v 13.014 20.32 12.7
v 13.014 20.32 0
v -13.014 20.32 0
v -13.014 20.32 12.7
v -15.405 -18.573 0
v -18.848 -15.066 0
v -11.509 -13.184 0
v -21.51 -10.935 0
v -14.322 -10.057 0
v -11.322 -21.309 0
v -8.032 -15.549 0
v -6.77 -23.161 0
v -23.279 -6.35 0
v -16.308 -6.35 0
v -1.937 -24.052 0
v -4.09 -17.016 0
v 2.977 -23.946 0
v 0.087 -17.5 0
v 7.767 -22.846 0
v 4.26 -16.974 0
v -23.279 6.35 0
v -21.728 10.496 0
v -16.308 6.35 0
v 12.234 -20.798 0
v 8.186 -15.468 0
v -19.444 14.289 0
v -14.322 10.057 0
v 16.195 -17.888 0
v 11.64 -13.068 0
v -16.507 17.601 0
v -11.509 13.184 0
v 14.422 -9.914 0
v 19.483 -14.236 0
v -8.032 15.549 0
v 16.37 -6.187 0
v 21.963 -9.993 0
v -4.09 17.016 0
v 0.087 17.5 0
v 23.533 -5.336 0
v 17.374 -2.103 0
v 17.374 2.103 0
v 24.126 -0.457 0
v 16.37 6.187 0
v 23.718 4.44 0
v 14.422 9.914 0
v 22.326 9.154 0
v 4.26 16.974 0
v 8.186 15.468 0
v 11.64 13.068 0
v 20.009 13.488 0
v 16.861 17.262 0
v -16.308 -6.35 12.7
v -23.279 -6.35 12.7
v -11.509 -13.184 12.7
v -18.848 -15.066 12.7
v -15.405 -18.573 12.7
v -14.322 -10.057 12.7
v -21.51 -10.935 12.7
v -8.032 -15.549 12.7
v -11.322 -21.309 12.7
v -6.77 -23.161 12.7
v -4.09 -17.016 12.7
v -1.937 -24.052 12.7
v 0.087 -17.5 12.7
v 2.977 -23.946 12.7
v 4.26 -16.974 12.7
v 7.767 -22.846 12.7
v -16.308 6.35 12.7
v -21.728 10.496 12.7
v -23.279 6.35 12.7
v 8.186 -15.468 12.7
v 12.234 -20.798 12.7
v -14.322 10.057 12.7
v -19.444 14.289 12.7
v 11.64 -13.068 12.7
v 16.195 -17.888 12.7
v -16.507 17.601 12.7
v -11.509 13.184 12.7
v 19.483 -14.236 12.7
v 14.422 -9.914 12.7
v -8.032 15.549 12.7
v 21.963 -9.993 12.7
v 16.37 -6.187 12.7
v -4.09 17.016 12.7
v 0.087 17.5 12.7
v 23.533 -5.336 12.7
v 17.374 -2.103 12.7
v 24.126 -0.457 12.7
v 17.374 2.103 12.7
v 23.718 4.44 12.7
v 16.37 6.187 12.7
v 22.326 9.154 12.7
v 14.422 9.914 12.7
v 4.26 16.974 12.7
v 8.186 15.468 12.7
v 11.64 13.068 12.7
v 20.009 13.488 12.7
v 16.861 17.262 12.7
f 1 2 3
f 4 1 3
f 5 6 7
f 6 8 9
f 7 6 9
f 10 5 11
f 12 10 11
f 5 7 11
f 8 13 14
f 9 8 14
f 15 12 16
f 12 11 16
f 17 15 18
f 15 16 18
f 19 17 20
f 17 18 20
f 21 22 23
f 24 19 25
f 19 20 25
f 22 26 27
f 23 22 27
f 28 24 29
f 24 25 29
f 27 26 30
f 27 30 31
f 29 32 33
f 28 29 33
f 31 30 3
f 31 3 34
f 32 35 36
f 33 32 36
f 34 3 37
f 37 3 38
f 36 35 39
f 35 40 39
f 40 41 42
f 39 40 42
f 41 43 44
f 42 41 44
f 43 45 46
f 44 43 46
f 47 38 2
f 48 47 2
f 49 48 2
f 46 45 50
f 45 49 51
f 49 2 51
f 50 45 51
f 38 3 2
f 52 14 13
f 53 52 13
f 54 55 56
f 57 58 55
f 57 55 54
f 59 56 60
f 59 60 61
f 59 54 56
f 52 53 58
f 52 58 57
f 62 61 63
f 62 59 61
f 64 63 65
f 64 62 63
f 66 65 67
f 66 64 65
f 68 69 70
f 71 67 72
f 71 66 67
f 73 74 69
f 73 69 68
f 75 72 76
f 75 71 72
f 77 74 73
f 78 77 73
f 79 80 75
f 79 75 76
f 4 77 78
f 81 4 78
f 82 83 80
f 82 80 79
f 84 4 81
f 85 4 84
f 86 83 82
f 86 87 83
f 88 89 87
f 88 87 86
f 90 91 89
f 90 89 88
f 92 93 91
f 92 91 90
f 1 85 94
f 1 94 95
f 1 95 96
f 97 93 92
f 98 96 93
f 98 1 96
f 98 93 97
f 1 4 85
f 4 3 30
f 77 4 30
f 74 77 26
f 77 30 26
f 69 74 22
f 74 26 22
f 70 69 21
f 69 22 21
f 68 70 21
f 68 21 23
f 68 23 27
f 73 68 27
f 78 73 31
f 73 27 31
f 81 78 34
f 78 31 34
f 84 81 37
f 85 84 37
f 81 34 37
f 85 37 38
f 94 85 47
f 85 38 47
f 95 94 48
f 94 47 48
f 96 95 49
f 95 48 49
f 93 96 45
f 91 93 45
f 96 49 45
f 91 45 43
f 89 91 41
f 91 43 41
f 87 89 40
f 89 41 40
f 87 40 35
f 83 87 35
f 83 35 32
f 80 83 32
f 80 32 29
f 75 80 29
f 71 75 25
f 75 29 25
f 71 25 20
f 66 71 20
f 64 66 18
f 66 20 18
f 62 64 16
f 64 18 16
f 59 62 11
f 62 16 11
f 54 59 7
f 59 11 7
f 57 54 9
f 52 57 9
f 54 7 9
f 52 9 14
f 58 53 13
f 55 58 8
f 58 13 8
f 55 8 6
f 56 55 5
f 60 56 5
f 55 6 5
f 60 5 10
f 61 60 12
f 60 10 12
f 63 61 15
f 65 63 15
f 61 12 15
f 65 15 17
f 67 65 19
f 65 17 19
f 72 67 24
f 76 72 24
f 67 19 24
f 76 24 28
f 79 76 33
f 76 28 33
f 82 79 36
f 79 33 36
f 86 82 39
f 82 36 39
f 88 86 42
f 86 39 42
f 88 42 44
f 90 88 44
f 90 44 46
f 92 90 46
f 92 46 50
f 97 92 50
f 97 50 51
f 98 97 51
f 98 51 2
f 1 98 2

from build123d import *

# Parameters (mm, degrees)
F1_DEPTH = 12.7


with BuildPart() as f1:
    # F0 (on Top) → F1 (new body)
    with BuildSketch(Plane.XY):
        with BuildLine():
            ThreePointArc((-16.307928, 6.35), (17.5006, 0), (-16.307928, -6.35))
            Line((-16.307928, -6.35), (-23.279485, -6.35))
            ThreePointArc((-23.279485, -6.35), (14.288778, -19.444478), (13.013627, 20.32))
            Line((13.013627, 20.32), (-13.013627, 20.32))
            ThreePointArc((-13.013627, 20.32), (-19.444478, 14.288778), (-23.279485, 6.35))
            Line((-23.279485, 6.35), (-16.307928, 6.35))
        make_face()
    extrude(amount=F1_DEPTH)


solid = f1.part
